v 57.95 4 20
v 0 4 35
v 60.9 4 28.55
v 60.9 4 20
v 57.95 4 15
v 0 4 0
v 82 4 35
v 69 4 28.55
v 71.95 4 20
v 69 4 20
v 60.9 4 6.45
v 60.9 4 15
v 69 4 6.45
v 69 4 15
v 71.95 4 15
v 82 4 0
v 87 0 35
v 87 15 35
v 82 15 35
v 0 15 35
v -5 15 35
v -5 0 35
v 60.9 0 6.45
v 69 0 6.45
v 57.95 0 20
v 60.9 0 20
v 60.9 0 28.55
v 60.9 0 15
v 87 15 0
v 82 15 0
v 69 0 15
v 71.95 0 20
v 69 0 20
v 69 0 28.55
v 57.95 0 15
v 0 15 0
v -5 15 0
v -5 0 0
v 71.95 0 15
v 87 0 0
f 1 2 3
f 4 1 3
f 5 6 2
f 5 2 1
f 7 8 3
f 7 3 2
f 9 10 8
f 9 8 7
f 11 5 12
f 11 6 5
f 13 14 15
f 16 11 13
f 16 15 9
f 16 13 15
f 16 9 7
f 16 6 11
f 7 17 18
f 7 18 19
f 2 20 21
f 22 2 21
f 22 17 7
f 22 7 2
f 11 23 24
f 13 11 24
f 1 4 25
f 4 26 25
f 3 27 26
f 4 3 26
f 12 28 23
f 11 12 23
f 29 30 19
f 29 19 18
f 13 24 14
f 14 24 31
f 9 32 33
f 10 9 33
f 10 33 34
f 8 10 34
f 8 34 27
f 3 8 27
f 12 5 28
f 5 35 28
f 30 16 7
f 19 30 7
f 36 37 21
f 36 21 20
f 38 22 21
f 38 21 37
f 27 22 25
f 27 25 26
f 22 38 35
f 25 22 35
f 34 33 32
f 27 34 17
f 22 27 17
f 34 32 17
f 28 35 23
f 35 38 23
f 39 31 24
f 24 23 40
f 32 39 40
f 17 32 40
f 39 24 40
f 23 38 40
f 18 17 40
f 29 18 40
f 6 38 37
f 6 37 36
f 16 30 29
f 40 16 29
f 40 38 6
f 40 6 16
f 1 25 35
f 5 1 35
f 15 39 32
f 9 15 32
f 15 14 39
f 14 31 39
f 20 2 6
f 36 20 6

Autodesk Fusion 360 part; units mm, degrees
sketch "Sketch1" plane through (0, 0, 0) normal (0, 1, 0) x (1, 0, 0)
  line L0 (0, 0) -> (82, 0)
  line L1 (82, 0) -> (82, -35)
  line L2 (82, -35) -> (0, -35)
  line L3 (0, -35) -> (0, 0)
  line L4 (82, -17.5) -> (69, -17.5) construction
  line L5 (69, -17.5) -> (64.95, -17.5) construction
  line L6 (60.9, -6.45) -> (69, -6.45)
  line L7 (69, -6.45) -> (69, -28.55)
  line L8 (69, -28.55) -> (60.9, -28.55)
  line L9 (60.9, -28.55) -> (60.9, -6.45)
  line L10 (60.9, -6.45) -> (69, -28.55) construction
  line L11 (69, -6.45) -> (60.9, -28.55) construction
  line L12 (82, -35) -> (87, -35)
  line L13 (87, -35) -> (87, 0)
  line L14 (87, 0) -> (82, 0)
  line L15 (82, 0) -> (82, -35)
  line L16 (0, -35) -> (-5, -35)
  line L17 (-5, -35) -> (-5, 0)
  line L18 (-5, 0) -> (0, 0)
  line L19 (0, 0) -> (0, -35)
  line L20 (71.95, -20) -> (57.95, -20)
  line L21 (57.95, -20) -> (57.95, -15)
  line L22 (57.95, -15) -> (71.95, -15)
  line L23 (71.95, -15) -> (71.95, -20)
  line L24 (71.95, -20) -> (57.95, -15) construction
  line L25 (57.95, -20) -> (71.95, -15) construction
  point P0 (64.95, -17.5)
  point P1 (64.95, -17.5)
  dimension "d1" = 82
  dimension "d2" = 35
  dimension "d3" = 13
  dimension "d4" = 4.05
  dimension "d5" = 8.1
  dimension "d6" = 22.1
  dimension "d7" = 5
  dimension "d8" = 35
  dimension "d9" = 5
  dimension "d10" = 35
  dimension "d15" = 14
  dimension "d16" = 5
extrude "Extrude1" add sketch "Sketch1" along normal blind 15 contours L3 L16 L17 L18 L19 | L1 L12 L13 L14 L15 makes body 1 at (0, 5, 23.3333) makes body 2 at (87, 5, 23.3333)
extrude "Extrude2" add sketch "Sketch1" along normal blind 4 contours L0 L1 L2 L3 L15 L19 | L9 L20 L21 L22 | L7 L20 L22 L23 bodies 1 2
extrude "Extrude3" cut sketch "Sketch1" along normal blind 4 contours L9 L20 L21 L22 | L7 L20 L22 L23 bodies 1
equation "d4 = ( 8.1 / 2 ) * 1 mm"
